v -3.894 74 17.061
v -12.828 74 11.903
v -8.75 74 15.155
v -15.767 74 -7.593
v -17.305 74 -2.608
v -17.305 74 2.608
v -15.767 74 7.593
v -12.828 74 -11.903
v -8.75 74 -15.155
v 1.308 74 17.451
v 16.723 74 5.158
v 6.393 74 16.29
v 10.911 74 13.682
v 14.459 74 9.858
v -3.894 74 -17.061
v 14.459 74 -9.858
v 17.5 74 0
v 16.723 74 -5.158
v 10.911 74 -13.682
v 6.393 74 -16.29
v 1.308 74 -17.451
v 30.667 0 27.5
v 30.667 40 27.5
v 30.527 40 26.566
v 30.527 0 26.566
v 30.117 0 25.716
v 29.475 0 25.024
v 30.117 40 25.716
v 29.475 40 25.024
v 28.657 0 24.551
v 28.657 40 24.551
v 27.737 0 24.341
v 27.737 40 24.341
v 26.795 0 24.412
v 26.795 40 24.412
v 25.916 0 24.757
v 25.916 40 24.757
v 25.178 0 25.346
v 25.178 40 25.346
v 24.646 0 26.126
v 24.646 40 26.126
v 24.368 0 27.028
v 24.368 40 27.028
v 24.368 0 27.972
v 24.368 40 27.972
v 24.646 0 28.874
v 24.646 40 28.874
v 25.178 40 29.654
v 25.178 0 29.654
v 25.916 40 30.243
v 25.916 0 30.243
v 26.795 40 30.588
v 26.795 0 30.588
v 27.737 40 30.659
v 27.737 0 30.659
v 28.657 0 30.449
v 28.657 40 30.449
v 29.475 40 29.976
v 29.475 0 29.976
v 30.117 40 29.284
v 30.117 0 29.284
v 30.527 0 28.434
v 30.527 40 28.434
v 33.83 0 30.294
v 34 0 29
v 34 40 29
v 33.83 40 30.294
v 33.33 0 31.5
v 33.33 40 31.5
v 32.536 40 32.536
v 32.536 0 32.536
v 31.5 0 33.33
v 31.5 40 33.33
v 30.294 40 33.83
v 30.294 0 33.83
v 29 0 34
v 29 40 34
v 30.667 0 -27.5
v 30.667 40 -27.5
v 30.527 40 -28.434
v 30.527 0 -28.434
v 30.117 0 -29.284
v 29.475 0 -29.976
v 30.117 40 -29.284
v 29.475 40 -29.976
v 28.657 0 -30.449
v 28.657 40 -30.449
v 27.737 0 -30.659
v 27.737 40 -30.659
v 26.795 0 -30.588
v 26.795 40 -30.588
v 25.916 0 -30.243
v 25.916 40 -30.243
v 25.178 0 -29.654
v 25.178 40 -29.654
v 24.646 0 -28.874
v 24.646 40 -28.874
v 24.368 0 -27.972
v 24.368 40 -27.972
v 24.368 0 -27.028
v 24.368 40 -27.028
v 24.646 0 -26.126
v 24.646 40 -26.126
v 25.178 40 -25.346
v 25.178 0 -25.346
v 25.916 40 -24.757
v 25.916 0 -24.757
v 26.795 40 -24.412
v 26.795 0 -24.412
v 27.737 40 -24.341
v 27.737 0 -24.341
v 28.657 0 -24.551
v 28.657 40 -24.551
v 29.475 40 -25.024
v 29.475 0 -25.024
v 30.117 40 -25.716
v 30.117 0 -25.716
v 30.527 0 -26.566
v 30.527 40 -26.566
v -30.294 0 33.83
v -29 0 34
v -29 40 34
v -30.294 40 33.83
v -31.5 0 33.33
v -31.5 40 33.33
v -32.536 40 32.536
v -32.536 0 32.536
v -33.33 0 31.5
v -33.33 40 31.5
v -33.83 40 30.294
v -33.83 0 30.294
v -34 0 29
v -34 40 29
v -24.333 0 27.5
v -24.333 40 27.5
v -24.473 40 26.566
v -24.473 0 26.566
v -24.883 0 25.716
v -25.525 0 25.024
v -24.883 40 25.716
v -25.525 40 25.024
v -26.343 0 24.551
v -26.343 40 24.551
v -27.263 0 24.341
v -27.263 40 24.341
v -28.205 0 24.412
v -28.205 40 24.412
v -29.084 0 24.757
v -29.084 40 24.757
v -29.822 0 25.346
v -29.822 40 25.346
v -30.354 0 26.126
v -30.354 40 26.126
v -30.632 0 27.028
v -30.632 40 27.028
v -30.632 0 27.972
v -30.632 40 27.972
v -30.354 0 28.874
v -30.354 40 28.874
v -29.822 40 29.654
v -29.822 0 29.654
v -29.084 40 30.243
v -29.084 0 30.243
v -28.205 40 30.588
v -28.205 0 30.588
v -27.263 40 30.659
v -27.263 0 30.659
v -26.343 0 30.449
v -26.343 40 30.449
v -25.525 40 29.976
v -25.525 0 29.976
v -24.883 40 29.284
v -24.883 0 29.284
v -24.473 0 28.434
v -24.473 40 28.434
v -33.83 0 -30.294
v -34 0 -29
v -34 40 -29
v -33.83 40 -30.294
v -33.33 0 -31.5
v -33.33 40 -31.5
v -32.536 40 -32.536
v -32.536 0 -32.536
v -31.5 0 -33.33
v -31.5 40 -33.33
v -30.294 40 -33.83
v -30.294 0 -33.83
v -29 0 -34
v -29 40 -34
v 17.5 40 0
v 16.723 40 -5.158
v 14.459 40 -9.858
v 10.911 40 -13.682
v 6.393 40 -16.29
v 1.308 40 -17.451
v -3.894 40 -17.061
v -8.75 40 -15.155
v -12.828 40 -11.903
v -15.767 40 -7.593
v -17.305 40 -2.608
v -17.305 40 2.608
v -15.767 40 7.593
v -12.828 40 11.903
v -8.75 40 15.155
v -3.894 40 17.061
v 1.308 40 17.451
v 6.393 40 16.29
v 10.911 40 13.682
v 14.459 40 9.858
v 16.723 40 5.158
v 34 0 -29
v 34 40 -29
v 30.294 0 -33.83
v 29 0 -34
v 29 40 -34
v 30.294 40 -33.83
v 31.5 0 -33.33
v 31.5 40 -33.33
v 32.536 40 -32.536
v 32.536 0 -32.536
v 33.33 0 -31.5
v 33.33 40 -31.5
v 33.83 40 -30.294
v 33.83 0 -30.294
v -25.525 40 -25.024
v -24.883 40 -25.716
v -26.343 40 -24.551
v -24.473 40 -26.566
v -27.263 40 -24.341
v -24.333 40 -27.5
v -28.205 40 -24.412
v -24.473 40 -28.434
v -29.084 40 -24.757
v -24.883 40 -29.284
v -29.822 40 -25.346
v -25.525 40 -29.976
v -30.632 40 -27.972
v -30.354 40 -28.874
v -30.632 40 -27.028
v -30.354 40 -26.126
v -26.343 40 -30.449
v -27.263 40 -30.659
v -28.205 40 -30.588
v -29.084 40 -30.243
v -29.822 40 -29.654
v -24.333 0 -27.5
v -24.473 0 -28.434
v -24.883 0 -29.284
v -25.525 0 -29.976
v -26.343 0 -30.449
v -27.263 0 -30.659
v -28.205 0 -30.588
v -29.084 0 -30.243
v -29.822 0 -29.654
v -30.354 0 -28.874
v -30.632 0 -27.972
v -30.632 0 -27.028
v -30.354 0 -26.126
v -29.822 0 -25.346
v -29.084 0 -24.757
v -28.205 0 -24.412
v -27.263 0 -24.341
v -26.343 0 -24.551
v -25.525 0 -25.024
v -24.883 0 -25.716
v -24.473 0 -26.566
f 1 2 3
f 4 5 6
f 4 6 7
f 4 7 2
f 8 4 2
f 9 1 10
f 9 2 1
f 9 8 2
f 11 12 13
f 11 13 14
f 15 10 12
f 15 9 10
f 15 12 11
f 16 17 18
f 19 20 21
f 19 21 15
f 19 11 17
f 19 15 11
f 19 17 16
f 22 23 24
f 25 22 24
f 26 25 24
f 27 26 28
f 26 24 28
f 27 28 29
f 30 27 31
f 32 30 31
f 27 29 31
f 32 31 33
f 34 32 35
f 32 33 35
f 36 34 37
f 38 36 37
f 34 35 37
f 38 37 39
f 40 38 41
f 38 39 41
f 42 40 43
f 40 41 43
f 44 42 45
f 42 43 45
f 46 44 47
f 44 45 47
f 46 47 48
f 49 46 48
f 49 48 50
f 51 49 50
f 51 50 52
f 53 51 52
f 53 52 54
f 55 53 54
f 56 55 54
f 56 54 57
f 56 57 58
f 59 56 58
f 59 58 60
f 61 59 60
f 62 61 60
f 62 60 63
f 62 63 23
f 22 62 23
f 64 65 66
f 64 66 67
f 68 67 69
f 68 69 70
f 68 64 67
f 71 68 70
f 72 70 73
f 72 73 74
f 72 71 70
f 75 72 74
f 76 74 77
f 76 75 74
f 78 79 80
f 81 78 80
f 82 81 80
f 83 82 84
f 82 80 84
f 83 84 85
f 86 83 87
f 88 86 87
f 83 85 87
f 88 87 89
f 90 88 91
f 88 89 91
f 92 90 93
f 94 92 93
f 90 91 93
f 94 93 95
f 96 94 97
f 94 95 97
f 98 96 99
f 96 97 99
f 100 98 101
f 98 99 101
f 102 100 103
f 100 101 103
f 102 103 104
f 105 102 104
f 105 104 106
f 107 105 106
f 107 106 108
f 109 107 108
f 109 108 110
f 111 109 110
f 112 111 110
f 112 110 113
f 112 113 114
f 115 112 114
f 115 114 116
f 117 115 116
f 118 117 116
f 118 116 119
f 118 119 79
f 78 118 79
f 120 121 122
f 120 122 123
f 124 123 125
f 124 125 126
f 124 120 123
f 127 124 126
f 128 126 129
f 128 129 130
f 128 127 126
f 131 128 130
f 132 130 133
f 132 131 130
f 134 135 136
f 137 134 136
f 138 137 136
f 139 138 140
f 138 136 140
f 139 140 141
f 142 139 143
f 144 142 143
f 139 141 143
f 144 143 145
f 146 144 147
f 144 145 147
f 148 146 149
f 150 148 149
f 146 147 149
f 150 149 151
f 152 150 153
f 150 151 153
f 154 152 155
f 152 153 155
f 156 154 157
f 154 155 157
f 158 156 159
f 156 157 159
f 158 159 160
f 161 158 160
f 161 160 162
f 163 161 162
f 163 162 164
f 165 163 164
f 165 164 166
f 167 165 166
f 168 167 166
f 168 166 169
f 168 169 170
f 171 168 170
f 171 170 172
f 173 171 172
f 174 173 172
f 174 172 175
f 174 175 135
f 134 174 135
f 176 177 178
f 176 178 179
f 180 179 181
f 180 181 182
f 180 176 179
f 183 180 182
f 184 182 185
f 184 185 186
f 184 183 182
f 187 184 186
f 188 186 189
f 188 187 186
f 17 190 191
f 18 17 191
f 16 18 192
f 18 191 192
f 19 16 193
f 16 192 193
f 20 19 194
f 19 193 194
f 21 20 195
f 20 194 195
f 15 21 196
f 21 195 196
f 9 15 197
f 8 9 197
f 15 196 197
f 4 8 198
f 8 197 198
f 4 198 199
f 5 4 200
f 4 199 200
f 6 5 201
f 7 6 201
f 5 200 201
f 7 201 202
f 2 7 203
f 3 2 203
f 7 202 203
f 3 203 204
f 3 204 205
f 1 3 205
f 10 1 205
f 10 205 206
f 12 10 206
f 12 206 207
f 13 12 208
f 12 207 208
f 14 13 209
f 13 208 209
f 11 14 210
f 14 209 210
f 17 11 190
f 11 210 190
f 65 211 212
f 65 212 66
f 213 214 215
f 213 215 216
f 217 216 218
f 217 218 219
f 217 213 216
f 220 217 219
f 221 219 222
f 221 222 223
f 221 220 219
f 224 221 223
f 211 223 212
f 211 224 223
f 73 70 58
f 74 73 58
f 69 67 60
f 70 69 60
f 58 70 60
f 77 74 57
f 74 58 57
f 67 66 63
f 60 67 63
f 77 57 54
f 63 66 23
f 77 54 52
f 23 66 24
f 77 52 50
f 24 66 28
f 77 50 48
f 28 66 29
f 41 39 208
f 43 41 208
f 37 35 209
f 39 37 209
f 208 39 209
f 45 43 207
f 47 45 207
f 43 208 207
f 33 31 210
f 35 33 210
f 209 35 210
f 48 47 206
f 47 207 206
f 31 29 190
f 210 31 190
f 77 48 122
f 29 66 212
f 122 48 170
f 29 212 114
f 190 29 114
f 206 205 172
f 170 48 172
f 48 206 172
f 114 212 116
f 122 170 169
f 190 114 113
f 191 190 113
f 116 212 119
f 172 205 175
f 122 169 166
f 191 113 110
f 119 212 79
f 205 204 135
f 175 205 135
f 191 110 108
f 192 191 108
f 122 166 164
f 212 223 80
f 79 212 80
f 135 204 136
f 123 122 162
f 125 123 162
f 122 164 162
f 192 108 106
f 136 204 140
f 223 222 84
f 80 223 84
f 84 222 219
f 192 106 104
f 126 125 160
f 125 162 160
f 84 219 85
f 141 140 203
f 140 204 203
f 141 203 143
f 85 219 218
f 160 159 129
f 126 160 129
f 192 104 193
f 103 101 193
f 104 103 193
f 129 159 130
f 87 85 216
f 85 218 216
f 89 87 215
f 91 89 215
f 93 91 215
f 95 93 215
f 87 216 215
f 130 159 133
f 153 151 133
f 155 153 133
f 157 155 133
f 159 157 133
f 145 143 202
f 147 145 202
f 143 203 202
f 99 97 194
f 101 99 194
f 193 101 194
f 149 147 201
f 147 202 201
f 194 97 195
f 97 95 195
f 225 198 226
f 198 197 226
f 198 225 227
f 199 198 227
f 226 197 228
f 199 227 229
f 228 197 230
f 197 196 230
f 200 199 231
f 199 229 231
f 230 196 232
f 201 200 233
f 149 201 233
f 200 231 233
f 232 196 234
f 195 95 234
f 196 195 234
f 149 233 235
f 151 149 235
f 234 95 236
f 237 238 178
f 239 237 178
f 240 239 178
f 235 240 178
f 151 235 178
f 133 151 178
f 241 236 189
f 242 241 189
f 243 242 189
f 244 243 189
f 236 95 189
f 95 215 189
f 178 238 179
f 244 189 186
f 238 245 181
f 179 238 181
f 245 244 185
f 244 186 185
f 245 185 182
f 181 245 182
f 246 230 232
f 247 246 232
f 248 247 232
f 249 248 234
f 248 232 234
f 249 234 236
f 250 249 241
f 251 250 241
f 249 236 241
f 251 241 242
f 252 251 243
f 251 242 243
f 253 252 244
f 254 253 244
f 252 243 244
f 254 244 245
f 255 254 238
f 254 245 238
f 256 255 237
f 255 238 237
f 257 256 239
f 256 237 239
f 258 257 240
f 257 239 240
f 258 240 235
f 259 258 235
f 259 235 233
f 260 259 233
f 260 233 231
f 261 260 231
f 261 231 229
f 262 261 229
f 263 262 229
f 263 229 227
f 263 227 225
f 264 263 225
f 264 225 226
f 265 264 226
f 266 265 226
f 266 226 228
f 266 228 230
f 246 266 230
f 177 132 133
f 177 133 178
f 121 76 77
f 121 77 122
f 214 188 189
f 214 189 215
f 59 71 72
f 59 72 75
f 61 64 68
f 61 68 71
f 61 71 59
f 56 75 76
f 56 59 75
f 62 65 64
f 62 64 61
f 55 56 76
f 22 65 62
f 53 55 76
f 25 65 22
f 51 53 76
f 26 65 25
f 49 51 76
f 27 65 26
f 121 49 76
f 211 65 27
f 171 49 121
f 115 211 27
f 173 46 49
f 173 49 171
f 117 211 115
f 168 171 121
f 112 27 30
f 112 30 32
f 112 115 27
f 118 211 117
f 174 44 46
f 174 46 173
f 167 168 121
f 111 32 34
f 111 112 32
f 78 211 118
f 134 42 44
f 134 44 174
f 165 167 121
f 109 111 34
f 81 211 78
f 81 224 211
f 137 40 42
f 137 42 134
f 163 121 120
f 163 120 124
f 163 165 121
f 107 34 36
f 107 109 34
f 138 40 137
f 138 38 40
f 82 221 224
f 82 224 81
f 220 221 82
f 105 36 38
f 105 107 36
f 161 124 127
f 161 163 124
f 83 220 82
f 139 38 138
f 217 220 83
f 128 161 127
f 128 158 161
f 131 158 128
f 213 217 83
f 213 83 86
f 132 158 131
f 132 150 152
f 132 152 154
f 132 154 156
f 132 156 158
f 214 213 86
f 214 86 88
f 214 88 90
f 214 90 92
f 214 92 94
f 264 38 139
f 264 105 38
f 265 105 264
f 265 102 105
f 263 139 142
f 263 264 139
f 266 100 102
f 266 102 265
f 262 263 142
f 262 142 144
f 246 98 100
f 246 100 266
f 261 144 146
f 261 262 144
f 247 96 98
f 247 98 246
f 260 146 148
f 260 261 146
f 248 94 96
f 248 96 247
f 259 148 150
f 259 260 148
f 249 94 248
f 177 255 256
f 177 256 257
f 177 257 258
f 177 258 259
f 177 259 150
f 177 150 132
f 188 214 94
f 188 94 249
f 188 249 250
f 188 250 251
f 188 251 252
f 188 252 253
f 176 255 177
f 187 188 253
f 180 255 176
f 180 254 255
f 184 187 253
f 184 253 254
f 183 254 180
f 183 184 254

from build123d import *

# Parameters (mm, degrees)
BOSS_EXTRUDE1_DEPTH = 40
SKETCH2_R           = 17.5
BOSS_EXTRUDE2_DEPTH = 34
CUT_EXTRUDE1_REACH  = 42
SKETCH3_R           = 3.167479455


with BuildPart() as part:
    # Sketch1 → Boss-Extrude1 (new body)
    with BuildSketch(Plane(origin=(0, 0, 0), x_dir=(1, 0, 0), z_dir=(0, 1, 0))):
        with BuildLine():
            Line((-29, 34), (29, 34))
            ThreePointArc((29, 34), (32.535533906, 32.535533906), (34, 29))
            Line((34, 29), (34, -29))
            ThreePointArc((34, -29), (32.535533906, -32.535533906), (29, -34))
            Line((29, -34), (-29, -34))
            ThreePointArc((-29, -34), (-32.535533906, -32.535533906), (-34, -29))
            Line((-34, -29), (-34, 29))
            ThreePointArc((-34, 29), (-32.535533906, 32.535533906), (-29, 34))
        make_face()
    extrude(amount=BOSS_EXTRUDE1_DEPTH)

    # Sketch2 → Boss-Extrude2 (add)
    with BuildSketch(Plane(origin=(0, 40, 0), x_dir=(1, 0, 0), z_dir=(0, 1, 0))):
        Circle(SKETCH2_R)
    extrude(amount=BOSS_EXTRUDE2_DEPTH)

    # Sketch3 → Cut-Extrude1 (cut, up to next)
    with BuildSketch(Plane(origin=(0, 40, 0), x_dir=(1, 0, 0), z_dir=(0, 1, 0)), mode=Mode.PRIVATE) as cut_extrude1_sk1:
        with Locations((-27.5, 27.5)):
            Circle(SKETCH3_R)
    cut_extrude1_tool1 = extrude(cut_extrude1_sk1.sketch, amount=-CUT_EXTRUDE1_REACH, mode=Mode.PRIVATE) & part.part
    add(cut_extrude1_tool1.solids().sort_by_distance((-27.5, 40, -27.5))[0], mode=Mode.SUBTRACT)
    # Sketch3 → Cut-Extrude1 (cut, up to next)
    with BuildSketch(Plane(origin=(0, 40, 0), x_dir=(1, 0, 0), z_dir=(0, 1, 0)), mode=Mode.PRIVATE) as cut_extrude1_sk2:
        with Locations((-27.5, -27.5)):
            Circle(SKETCH3_R)
    cut_extrude1_tool2 = extrude(cut_extrude1_sk2.sketch, amount=-CUT_EXTRUDE1_REACH, mode=Mode.PRIVATE) & part.part
    add(cut_extrude1_tool2.solids().sort_by_distance((-27.5, 40, 27.5))[0], mode=Mode.SUBTRACT)
    # Sketch3 → Cut-Extrude1 (cut, up to next)
    with BuildSketch(Plane(origin=(0, 40, 0), x_dir=(1, 0, 0), z_dir=(0, 1, 0)), mode=Mode.PRIVATE) as cut_extrude1_sk3:
        with Locations((27.5, -27.5)):
            Circle(SKETCH3_R)
    cut_extrude1_tool3 = extrude(cut_extrude1_sk3.sketch, amount=-CUT_EXTRUDE1_REACH, mode=Mode.PRIVATE) & part.part
    add(cut_extrude1_tool3.solids().sort_by_distance((27.5, 40, 27.5))[0], mode=Mode.SUBTRACT)
    # Sketch3 → Cut-Extrude1 (cut, up to next)
    with BuildSketch(Plane(origin=(0, 40, 0), x_dir=(1, 0, 0), z_dir=(0, 1, 0)), mode=Mode.PRIVATE) as cut_extrude1_sk4:
        with Locations((27.5, 27.5)):
            Circle(SKETCH3_R)
    cut_extrude1_tool4 = extrude(cut_extrude1_sk4.sketch, amount=-CUT_EXTRUDE1_REACH, mode=Mode.PRIVATE) & part.part
    add(cut_extrude1_tool4.solids().sort_by_distance((27.5, 40, -27.5))[0], mode=Mode.SUBTRACT)


solid = part.part
